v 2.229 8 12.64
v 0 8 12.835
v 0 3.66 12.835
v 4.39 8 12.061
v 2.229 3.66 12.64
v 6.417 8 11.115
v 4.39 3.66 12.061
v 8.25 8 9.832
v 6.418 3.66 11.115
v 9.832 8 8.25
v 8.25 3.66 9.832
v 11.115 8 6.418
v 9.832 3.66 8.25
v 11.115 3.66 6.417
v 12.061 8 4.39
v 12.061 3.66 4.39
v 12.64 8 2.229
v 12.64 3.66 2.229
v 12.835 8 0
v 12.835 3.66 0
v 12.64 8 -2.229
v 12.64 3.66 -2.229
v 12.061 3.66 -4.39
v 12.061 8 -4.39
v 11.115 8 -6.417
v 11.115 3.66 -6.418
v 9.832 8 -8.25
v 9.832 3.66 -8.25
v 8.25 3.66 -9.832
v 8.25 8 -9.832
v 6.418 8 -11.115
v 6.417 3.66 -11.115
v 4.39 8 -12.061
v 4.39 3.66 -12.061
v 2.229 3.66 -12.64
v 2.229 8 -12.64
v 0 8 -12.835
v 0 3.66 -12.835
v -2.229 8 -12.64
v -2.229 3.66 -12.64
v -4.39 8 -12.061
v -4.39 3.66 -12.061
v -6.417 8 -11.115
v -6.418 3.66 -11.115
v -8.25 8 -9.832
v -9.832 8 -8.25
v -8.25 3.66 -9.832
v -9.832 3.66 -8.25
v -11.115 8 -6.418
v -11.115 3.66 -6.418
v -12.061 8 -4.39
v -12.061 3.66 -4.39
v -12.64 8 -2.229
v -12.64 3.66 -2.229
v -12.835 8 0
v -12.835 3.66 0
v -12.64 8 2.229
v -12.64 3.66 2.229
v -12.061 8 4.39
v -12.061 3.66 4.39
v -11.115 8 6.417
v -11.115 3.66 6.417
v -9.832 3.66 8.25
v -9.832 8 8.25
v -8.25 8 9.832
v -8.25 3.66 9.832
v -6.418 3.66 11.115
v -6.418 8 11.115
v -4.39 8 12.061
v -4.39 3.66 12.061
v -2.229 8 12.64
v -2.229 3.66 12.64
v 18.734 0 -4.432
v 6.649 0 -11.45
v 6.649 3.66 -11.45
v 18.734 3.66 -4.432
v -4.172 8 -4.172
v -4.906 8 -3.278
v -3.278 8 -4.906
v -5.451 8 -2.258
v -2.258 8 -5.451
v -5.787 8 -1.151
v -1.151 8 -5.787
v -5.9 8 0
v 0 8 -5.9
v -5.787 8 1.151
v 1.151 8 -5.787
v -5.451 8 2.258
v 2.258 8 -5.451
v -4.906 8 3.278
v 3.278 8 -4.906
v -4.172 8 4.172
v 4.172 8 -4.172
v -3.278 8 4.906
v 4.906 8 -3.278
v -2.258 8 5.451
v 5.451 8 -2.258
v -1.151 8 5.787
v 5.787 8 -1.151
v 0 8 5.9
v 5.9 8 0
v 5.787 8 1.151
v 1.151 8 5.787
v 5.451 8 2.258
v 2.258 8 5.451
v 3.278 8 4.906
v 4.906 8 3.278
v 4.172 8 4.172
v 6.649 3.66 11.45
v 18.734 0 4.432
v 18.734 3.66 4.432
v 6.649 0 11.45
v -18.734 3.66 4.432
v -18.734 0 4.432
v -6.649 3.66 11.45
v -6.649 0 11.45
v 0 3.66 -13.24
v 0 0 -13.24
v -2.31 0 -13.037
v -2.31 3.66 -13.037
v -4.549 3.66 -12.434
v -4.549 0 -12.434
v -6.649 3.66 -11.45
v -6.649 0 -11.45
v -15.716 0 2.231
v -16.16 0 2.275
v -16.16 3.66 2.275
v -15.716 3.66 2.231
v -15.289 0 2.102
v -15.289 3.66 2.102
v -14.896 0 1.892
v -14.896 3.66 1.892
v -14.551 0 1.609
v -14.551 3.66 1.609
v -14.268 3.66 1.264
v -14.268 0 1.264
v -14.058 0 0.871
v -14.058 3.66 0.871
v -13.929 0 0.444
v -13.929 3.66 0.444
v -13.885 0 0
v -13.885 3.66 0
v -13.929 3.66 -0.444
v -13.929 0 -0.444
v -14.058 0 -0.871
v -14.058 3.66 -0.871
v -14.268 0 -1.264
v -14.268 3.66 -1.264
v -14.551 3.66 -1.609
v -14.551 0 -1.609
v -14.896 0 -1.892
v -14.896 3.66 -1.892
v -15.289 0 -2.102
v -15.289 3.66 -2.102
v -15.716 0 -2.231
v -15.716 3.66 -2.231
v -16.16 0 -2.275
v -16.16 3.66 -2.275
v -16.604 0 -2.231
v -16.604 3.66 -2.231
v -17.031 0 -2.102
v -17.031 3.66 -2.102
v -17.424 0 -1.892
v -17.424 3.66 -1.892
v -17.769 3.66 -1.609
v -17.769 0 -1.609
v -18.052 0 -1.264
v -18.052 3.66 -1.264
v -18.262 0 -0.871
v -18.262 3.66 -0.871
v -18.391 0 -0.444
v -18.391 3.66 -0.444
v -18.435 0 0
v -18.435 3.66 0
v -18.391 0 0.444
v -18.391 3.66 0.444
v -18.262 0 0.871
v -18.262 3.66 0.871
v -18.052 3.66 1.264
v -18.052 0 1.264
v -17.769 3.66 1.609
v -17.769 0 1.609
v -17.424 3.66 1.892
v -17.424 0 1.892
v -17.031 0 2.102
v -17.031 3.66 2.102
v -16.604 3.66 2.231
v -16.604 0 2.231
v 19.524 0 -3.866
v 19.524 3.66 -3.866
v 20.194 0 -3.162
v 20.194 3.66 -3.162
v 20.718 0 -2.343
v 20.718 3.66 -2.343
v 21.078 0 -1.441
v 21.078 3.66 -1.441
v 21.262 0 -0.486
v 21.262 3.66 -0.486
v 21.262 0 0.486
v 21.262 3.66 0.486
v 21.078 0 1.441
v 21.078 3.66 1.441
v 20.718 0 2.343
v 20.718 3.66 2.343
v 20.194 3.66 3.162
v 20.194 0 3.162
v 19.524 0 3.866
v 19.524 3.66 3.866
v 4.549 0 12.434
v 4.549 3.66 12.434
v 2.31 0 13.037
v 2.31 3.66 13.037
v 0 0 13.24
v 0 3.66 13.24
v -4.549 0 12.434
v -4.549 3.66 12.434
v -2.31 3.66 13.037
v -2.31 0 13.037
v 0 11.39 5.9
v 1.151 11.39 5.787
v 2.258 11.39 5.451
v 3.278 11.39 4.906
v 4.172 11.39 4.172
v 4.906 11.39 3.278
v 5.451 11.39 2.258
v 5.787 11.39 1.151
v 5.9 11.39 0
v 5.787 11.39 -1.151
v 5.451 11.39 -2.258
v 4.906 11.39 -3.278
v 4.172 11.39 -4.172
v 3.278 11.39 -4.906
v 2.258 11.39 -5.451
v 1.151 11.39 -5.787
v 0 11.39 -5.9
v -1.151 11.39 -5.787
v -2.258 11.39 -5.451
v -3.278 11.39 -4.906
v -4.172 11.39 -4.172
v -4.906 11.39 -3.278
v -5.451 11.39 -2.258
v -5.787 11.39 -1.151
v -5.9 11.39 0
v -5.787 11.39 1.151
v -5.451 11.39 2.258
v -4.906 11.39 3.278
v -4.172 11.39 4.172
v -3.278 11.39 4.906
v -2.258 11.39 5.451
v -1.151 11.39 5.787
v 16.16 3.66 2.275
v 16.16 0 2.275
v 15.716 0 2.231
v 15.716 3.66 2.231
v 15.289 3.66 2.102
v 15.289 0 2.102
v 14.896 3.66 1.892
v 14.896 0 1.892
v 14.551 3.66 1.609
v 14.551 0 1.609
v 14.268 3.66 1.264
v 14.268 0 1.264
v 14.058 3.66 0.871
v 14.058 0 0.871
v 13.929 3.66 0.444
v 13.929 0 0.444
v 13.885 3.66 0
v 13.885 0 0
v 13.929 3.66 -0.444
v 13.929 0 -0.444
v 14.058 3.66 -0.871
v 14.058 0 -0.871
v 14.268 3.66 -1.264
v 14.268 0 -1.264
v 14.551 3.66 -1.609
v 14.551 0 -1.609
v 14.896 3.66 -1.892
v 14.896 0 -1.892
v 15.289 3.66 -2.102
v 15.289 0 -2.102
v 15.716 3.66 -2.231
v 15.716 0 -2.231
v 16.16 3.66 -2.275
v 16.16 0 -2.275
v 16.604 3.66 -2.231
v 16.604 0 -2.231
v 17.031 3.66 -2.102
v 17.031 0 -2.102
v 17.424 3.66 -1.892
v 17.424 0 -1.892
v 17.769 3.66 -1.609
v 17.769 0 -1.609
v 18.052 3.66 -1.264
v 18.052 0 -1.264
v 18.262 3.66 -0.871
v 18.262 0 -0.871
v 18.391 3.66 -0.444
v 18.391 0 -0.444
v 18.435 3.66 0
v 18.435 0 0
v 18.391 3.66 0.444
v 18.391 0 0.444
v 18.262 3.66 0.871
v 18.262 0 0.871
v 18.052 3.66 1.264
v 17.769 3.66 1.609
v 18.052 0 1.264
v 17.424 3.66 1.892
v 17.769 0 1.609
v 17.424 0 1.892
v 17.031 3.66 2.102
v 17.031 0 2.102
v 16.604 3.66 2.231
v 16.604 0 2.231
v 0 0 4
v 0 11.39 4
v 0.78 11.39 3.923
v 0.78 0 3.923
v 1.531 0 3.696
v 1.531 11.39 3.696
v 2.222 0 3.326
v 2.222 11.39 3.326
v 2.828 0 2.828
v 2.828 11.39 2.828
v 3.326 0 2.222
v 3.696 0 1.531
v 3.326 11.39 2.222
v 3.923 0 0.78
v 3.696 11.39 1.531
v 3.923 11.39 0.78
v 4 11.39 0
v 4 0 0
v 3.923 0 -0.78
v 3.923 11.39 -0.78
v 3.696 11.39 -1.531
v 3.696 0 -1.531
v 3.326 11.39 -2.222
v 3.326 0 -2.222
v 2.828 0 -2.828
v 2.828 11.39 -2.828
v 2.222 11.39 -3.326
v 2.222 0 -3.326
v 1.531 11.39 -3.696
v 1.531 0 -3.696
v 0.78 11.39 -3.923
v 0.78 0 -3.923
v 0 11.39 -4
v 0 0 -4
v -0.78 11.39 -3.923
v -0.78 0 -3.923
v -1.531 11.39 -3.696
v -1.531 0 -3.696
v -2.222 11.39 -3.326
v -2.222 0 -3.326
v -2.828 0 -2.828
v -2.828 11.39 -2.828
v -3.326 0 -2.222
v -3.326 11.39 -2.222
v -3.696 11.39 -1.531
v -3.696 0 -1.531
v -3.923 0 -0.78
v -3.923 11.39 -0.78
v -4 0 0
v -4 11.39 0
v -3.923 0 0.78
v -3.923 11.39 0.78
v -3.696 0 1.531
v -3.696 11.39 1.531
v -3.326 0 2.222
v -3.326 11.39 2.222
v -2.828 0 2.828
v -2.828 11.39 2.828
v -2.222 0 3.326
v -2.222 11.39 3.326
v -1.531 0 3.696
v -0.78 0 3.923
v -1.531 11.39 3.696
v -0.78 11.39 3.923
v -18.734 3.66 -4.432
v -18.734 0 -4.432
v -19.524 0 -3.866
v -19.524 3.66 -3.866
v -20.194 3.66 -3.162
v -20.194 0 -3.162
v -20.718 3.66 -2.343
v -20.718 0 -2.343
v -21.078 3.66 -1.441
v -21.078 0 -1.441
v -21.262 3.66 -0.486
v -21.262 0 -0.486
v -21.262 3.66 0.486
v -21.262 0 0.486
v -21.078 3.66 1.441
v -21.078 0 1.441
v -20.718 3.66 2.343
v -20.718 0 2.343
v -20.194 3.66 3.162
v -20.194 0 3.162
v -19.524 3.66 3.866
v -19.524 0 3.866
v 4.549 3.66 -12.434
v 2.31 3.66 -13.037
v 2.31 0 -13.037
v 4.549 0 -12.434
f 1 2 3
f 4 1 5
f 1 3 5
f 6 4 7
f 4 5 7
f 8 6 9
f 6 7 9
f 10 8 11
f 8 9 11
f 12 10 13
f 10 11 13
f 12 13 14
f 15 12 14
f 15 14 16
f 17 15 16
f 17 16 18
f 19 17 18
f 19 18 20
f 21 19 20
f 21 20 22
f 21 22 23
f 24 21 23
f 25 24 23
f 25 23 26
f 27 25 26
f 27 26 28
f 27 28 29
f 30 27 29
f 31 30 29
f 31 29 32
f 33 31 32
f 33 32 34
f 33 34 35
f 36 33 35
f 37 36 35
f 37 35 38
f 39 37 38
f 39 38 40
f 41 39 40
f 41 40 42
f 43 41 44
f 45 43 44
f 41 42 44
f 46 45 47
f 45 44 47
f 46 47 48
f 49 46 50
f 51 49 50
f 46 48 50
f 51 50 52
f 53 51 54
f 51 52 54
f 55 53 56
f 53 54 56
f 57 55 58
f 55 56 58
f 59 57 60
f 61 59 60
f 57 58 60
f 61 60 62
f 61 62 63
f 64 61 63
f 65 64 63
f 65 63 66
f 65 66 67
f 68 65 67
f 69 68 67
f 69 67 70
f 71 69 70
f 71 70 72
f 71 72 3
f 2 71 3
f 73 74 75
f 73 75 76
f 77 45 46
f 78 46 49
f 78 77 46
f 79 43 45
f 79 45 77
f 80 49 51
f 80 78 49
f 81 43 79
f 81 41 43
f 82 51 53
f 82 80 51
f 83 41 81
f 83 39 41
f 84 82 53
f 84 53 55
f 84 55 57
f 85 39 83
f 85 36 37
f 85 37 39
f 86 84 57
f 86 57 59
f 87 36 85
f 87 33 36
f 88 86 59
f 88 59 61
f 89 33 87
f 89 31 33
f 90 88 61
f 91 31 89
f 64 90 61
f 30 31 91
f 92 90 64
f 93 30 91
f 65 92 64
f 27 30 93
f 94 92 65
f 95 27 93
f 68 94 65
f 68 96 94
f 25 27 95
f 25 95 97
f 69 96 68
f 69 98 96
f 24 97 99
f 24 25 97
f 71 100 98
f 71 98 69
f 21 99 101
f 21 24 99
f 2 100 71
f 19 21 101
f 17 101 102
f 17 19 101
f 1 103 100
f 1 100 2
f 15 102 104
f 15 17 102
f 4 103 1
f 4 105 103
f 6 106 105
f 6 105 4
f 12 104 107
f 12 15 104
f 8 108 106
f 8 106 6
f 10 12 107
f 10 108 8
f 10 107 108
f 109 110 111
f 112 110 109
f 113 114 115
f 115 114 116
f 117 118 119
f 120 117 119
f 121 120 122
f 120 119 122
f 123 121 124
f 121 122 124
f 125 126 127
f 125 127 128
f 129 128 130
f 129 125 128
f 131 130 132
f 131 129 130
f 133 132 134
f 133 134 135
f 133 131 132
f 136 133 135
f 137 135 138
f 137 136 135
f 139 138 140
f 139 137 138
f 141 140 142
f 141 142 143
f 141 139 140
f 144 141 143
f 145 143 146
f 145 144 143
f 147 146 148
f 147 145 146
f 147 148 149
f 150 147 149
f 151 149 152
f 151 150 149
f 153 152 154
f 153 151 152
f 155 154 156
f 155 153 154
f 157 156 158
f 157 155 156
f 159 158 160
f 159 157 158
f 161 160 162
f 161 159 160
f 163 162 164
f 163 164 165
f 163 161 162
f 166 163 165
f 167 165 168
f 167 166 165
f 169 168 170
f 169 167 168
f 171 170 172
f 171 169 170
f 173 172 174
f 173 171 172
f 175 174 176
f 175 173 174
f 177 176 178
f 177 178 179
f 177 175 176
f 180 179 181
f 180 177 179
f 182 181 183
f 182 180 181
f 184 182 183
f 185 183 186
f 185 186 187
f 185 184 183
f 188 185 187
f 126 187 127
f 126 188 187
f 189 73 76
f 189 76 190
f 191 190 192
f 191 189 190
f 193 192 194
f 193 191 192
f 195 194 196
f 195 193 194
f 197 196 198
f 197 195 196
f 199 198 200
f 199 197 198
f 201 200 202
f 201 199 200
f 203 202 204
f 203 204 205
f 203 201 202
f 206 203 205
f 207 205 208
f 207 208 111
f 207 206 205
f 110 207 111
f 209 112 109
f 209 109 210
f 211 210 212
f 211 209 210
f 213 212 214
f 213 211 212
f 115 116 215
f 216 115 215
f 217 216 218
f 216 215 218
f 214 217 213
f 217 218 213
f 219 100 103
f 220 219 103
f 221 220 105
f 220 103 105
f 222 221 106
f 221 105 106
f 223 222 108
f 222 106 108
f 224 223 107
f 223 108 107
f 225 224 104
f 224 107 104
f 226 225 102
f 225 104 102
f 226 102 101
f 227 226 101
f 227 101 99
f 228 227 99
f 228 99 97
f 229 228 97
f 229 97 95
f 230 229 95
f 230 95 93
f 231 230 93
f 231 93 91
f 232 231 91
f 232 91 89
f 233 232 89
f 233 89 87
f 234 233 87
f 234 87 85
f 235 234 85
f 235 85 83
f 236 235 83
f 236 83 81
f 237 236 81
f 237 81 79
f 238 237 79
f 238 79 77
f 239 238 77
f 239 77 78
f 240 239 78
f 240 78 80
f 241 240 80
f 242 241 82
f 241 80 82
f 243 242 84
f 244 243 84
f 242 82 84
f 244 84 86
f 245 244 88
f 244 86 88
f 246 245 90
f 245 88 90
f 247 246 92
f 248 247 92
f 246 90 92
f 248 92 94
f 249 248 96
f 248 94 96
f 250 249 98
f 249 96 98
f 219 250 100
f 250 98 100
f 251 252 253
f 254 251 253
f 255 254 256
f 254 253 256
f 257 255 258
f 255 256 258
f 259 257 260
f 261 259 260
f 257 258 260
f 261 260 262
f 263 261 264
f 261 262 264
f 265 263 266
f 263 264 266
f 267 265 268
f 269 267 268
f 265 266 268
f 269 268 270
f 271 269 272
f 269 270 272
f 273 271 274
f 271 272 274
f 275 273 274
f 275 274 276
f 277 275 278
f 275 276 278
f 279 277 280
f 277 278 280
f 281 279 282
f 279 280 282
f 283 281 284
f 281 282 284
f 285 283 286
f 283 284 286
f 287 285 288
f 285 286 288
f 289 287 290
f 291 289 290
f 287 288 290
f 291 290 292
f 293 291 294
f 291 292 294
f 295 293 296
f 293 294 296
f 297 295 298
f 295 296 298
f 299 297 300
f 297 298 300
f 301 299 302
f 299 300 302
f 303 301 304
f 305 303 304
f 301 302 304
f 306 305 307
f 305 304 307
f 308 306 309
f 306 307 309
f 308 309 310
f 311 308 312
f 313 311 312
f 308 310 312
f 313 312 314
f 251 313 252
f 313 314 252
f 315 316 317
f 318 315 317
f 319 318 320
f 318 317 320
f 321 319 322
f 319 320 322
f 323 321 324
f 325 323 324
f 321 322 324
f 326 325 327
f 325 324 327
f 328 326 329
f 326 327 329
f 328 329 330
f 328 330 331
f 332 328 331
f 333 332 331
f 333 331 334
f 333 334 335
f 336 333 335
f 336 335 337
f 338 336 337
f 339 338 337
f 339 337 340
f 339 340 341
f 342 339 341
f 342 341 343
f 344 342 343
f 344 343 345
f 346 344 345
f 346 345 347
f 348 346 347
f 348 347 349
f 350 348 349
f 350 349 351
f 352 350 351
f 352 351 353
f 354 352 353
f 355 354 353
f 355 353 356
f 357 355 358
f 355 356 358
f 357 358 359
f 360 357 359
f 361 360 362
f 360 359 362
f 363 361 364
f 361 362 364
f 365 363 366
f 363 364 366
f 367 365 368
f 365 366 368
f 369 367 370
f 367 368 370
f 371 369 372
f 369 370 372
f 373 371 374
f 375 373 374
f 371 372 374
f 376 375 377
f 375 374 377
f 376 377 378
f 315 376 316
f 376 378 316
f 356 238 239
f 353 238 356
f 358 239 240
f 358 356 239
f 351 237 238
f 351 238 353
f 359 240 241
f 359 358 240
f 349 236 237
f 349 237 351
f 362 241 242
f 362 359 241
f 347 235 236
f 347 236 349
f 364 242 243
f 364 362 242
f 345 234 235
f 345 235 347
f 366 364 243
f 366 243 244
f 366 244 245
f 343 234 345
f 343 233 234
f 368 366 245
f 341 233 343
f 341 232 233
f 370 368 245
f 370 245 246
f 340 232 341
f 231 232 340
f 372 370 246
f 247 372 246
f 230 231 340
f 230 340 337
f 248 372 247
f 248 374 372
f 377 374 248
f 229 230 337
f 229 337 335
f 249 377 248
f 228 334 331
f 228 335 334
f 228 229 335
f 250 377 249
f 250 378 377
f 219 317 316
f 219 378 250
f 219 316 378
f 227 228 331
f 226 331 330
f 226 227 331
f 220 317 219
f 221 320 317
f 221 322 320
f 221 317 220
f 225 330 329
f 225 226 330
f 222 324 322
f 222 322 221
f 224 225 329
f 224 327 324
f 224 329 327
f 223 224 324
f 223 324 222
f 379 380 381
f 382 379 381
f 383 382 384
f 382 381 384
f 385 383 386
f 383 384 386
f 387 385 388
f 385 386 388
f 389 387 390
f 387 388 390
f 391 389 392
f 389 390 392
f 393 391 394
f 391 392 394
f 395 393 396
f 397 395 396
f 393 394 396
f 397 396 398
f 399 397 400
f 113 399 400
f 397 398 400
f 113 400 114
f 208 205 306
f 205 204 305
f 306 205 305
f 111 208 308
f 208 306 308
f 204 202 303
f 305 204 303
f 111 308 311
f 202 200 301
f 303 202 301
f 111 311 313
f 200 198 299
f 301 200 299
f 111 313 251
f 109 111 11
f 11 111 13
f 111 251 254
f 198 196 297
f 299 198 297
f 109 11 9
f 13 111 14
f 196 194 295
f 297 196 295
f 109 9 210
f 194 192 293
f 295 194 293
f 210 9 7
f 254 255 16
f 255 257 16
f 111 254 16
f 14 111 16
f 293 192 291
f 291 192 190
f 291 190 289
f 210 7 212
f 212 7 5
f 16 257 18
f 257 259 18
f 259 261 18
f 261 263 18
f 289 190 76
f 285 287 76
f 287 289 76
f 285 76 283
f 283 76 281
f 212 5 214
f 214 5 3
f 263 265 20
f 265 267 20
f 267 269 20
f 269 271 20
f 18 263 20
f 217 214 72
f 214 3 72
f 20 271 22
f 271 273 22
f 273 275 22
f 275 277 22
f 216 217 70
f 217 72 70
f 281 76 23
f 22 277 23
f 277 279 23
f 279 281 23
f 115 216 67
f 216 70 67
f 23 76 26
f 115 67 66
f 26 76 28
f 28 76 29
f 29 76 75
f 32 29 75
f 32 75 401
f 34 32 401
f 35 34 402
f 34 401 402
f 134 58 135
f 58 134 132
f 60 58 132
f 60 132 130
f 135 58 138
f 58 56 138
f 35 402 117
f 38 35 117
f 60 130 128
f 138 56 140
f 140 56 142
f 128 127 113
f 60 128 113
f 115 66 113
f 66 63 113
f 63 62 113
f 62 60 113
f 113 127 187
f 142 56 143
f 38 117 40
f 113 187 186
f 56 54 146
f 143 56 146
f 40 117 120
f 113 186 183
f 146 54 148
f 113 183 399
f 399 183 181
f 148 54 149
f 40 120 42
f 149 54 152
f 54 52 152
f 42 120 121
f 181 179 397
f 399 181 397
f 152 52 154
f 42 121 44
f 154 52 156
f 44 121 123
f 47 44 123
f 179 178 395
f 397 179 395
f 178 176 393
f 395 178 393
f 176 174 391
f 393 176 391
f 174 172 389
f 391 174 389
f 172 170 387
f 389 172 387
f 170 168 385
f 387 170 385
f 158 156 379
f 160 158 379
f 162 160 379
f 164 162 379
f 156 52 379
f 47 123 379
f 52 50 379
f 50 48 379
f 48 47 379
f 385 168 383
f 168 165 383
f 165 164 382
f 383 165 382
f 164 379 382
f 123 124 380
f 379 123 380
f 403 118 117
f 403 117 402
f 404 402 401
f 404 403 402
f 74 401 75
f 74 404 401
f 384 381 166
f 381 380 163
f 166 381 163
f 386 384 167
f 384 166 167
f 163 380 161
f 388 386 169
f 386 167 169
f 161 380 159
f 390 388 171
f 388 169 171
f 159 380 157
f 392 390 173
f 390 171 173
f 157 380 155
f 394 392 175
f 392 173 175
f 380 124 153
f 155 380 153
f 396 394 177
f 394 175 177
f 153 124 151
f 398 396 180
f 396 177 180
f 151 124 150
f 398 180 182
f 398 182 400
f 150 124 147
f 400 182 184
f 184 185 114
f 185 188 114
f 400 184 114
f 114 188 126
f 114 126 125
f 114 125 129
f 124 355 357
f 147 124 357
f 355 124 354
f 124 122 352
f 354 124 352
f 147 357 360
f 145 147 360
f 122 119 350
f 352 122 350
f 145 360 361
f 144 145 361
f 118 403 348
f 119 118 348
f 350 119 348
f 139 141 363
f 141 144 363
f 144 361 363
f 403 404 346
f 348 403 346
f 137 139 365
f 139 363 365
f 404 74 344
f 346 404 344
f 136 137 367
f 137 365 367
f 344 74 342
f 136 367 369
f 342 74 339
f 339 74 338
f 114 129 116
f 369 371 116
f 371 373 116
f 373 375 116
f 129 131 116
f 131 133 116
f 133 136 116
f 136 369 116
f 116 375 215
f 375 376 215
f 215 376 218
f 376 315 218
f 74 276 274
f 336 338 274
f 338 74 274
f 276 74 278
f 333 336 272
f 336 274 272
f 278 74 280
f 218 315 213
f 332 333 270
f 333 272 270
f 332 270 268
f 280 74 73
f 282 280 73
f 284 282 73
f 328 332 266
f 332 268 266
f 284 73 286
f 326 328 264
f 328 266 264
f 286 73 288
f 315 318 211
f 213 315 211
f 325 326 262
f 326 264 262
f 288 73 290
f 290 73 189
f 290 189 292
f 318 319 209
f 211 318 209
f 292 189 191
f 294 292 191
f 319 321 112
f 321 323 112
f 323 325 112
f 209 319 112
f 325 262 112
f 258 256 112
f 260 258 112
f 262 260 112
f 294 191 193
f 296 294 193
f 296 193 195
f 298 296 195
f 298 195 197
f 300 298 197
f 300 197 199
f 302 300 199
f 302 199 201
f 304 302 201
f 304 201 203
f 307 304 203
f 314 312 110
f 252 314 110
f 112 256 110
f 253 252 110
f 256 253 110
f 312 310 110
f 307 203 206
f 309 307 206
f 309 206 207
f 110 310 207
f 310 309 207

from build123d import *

# Parameters (mm, degrees)
SKETCH1_R           = 2.275
BOSS_EXTRUDE4_DEPTH = 3.66
SKETCH8_R           = 12.835
BOSS_EXTRUDE5_DEPTH = 8
SKETCH9_R           = 5.9
BOSS_EXTRUDE6_DEPTH = 11.39
SKETCH10_R          = 4
CUT_EXTRUDE3_DEPTH  = 28.533269421


with BuildPart() as part:
    # Sketch1 → Boss-Extrude4 (new body)
    with BuildSketch(Plane(origin=(0, 0, 0), x_dir=(1, 0, 0), z_dir=(0, 1, 0))):
        with BuildLine():
            Line((-6.648675743, 11.449572519), (-18.733599938, 4.431953109))
            ThreePointArc((-18.733599938, 4.431953109), (-21.285, 0), (-18.733599938, -4.431953109))
            Line((-18.733599938, -4.431953109), (-6.648675743, -11.449572519))
            ThreePointArc((-6.648675743, -11.449572519), (-3.442764866, -12.784559831), (0, -13.24))
            Line((0, -13.24), (0, 13.24))
            ThreePointArc((0, 13.24), (-3.442764866, 12.784559831), (-6.648675743, 11.449572519))
        make_face()
        with Locations(Location((-16.16, 0, 0), (0, 0, 270))):
            Circle(SKETCH1_R, mode=Mode.SUBTRACT)
    boss_extrude4 = extrude(amount=BOSS_EXTRUDE4_DEPTH)

    # Mirror2: Boss-Extrude4 across plane
    add(boss_extrude4.mirror(Plane(origin=(0, 0, 0), x_dir=(0, 0, 1), z_dir=(1, 0, 0))))

    # Sketch8 → Boss-Extrude5 (add)
    with BuildSketch(Plane(origin=(0, 0, 0), x_dir=(1, 0, 0), z_dir=(0, 1, 0))):
        with Locations(Location((0, 0, 0), (0, 0, 270))):
            Circle(SKETCH8_R)
    extrude(amount=BOSS_EXTRUDE5_DEPTH)

    # Sketch9 → Boss-Extrude6 (add)
    with BuildSketch(Plane(origin=(0, 0, 0), x_dir=(1, 0, 0), z_dir=(0, 1, 0))):
        with Locations(Location((0, 0, 0), (0, 0, 270))):
            Circle(SKETCH9_R)
    extrude(amount=BOSS_EXTRUDE6_DEPTH)

    # Sketch10 → Cut-Extrude3 (cut, through all)
    with BuildSketch(Plane(origin=(0, 11.39, 0), x_dir=(1, 0, 0), z_dir=(0, 1, 0))):
        with Locations(Location((0, 0, 0), (0, 0, 270))):
            Circle(SKETCH10_R)
    extrude(amount=-CUT_EXTRUDE3_DEPTH, mode=Mode.SUBTRACT)


solid = part.part
